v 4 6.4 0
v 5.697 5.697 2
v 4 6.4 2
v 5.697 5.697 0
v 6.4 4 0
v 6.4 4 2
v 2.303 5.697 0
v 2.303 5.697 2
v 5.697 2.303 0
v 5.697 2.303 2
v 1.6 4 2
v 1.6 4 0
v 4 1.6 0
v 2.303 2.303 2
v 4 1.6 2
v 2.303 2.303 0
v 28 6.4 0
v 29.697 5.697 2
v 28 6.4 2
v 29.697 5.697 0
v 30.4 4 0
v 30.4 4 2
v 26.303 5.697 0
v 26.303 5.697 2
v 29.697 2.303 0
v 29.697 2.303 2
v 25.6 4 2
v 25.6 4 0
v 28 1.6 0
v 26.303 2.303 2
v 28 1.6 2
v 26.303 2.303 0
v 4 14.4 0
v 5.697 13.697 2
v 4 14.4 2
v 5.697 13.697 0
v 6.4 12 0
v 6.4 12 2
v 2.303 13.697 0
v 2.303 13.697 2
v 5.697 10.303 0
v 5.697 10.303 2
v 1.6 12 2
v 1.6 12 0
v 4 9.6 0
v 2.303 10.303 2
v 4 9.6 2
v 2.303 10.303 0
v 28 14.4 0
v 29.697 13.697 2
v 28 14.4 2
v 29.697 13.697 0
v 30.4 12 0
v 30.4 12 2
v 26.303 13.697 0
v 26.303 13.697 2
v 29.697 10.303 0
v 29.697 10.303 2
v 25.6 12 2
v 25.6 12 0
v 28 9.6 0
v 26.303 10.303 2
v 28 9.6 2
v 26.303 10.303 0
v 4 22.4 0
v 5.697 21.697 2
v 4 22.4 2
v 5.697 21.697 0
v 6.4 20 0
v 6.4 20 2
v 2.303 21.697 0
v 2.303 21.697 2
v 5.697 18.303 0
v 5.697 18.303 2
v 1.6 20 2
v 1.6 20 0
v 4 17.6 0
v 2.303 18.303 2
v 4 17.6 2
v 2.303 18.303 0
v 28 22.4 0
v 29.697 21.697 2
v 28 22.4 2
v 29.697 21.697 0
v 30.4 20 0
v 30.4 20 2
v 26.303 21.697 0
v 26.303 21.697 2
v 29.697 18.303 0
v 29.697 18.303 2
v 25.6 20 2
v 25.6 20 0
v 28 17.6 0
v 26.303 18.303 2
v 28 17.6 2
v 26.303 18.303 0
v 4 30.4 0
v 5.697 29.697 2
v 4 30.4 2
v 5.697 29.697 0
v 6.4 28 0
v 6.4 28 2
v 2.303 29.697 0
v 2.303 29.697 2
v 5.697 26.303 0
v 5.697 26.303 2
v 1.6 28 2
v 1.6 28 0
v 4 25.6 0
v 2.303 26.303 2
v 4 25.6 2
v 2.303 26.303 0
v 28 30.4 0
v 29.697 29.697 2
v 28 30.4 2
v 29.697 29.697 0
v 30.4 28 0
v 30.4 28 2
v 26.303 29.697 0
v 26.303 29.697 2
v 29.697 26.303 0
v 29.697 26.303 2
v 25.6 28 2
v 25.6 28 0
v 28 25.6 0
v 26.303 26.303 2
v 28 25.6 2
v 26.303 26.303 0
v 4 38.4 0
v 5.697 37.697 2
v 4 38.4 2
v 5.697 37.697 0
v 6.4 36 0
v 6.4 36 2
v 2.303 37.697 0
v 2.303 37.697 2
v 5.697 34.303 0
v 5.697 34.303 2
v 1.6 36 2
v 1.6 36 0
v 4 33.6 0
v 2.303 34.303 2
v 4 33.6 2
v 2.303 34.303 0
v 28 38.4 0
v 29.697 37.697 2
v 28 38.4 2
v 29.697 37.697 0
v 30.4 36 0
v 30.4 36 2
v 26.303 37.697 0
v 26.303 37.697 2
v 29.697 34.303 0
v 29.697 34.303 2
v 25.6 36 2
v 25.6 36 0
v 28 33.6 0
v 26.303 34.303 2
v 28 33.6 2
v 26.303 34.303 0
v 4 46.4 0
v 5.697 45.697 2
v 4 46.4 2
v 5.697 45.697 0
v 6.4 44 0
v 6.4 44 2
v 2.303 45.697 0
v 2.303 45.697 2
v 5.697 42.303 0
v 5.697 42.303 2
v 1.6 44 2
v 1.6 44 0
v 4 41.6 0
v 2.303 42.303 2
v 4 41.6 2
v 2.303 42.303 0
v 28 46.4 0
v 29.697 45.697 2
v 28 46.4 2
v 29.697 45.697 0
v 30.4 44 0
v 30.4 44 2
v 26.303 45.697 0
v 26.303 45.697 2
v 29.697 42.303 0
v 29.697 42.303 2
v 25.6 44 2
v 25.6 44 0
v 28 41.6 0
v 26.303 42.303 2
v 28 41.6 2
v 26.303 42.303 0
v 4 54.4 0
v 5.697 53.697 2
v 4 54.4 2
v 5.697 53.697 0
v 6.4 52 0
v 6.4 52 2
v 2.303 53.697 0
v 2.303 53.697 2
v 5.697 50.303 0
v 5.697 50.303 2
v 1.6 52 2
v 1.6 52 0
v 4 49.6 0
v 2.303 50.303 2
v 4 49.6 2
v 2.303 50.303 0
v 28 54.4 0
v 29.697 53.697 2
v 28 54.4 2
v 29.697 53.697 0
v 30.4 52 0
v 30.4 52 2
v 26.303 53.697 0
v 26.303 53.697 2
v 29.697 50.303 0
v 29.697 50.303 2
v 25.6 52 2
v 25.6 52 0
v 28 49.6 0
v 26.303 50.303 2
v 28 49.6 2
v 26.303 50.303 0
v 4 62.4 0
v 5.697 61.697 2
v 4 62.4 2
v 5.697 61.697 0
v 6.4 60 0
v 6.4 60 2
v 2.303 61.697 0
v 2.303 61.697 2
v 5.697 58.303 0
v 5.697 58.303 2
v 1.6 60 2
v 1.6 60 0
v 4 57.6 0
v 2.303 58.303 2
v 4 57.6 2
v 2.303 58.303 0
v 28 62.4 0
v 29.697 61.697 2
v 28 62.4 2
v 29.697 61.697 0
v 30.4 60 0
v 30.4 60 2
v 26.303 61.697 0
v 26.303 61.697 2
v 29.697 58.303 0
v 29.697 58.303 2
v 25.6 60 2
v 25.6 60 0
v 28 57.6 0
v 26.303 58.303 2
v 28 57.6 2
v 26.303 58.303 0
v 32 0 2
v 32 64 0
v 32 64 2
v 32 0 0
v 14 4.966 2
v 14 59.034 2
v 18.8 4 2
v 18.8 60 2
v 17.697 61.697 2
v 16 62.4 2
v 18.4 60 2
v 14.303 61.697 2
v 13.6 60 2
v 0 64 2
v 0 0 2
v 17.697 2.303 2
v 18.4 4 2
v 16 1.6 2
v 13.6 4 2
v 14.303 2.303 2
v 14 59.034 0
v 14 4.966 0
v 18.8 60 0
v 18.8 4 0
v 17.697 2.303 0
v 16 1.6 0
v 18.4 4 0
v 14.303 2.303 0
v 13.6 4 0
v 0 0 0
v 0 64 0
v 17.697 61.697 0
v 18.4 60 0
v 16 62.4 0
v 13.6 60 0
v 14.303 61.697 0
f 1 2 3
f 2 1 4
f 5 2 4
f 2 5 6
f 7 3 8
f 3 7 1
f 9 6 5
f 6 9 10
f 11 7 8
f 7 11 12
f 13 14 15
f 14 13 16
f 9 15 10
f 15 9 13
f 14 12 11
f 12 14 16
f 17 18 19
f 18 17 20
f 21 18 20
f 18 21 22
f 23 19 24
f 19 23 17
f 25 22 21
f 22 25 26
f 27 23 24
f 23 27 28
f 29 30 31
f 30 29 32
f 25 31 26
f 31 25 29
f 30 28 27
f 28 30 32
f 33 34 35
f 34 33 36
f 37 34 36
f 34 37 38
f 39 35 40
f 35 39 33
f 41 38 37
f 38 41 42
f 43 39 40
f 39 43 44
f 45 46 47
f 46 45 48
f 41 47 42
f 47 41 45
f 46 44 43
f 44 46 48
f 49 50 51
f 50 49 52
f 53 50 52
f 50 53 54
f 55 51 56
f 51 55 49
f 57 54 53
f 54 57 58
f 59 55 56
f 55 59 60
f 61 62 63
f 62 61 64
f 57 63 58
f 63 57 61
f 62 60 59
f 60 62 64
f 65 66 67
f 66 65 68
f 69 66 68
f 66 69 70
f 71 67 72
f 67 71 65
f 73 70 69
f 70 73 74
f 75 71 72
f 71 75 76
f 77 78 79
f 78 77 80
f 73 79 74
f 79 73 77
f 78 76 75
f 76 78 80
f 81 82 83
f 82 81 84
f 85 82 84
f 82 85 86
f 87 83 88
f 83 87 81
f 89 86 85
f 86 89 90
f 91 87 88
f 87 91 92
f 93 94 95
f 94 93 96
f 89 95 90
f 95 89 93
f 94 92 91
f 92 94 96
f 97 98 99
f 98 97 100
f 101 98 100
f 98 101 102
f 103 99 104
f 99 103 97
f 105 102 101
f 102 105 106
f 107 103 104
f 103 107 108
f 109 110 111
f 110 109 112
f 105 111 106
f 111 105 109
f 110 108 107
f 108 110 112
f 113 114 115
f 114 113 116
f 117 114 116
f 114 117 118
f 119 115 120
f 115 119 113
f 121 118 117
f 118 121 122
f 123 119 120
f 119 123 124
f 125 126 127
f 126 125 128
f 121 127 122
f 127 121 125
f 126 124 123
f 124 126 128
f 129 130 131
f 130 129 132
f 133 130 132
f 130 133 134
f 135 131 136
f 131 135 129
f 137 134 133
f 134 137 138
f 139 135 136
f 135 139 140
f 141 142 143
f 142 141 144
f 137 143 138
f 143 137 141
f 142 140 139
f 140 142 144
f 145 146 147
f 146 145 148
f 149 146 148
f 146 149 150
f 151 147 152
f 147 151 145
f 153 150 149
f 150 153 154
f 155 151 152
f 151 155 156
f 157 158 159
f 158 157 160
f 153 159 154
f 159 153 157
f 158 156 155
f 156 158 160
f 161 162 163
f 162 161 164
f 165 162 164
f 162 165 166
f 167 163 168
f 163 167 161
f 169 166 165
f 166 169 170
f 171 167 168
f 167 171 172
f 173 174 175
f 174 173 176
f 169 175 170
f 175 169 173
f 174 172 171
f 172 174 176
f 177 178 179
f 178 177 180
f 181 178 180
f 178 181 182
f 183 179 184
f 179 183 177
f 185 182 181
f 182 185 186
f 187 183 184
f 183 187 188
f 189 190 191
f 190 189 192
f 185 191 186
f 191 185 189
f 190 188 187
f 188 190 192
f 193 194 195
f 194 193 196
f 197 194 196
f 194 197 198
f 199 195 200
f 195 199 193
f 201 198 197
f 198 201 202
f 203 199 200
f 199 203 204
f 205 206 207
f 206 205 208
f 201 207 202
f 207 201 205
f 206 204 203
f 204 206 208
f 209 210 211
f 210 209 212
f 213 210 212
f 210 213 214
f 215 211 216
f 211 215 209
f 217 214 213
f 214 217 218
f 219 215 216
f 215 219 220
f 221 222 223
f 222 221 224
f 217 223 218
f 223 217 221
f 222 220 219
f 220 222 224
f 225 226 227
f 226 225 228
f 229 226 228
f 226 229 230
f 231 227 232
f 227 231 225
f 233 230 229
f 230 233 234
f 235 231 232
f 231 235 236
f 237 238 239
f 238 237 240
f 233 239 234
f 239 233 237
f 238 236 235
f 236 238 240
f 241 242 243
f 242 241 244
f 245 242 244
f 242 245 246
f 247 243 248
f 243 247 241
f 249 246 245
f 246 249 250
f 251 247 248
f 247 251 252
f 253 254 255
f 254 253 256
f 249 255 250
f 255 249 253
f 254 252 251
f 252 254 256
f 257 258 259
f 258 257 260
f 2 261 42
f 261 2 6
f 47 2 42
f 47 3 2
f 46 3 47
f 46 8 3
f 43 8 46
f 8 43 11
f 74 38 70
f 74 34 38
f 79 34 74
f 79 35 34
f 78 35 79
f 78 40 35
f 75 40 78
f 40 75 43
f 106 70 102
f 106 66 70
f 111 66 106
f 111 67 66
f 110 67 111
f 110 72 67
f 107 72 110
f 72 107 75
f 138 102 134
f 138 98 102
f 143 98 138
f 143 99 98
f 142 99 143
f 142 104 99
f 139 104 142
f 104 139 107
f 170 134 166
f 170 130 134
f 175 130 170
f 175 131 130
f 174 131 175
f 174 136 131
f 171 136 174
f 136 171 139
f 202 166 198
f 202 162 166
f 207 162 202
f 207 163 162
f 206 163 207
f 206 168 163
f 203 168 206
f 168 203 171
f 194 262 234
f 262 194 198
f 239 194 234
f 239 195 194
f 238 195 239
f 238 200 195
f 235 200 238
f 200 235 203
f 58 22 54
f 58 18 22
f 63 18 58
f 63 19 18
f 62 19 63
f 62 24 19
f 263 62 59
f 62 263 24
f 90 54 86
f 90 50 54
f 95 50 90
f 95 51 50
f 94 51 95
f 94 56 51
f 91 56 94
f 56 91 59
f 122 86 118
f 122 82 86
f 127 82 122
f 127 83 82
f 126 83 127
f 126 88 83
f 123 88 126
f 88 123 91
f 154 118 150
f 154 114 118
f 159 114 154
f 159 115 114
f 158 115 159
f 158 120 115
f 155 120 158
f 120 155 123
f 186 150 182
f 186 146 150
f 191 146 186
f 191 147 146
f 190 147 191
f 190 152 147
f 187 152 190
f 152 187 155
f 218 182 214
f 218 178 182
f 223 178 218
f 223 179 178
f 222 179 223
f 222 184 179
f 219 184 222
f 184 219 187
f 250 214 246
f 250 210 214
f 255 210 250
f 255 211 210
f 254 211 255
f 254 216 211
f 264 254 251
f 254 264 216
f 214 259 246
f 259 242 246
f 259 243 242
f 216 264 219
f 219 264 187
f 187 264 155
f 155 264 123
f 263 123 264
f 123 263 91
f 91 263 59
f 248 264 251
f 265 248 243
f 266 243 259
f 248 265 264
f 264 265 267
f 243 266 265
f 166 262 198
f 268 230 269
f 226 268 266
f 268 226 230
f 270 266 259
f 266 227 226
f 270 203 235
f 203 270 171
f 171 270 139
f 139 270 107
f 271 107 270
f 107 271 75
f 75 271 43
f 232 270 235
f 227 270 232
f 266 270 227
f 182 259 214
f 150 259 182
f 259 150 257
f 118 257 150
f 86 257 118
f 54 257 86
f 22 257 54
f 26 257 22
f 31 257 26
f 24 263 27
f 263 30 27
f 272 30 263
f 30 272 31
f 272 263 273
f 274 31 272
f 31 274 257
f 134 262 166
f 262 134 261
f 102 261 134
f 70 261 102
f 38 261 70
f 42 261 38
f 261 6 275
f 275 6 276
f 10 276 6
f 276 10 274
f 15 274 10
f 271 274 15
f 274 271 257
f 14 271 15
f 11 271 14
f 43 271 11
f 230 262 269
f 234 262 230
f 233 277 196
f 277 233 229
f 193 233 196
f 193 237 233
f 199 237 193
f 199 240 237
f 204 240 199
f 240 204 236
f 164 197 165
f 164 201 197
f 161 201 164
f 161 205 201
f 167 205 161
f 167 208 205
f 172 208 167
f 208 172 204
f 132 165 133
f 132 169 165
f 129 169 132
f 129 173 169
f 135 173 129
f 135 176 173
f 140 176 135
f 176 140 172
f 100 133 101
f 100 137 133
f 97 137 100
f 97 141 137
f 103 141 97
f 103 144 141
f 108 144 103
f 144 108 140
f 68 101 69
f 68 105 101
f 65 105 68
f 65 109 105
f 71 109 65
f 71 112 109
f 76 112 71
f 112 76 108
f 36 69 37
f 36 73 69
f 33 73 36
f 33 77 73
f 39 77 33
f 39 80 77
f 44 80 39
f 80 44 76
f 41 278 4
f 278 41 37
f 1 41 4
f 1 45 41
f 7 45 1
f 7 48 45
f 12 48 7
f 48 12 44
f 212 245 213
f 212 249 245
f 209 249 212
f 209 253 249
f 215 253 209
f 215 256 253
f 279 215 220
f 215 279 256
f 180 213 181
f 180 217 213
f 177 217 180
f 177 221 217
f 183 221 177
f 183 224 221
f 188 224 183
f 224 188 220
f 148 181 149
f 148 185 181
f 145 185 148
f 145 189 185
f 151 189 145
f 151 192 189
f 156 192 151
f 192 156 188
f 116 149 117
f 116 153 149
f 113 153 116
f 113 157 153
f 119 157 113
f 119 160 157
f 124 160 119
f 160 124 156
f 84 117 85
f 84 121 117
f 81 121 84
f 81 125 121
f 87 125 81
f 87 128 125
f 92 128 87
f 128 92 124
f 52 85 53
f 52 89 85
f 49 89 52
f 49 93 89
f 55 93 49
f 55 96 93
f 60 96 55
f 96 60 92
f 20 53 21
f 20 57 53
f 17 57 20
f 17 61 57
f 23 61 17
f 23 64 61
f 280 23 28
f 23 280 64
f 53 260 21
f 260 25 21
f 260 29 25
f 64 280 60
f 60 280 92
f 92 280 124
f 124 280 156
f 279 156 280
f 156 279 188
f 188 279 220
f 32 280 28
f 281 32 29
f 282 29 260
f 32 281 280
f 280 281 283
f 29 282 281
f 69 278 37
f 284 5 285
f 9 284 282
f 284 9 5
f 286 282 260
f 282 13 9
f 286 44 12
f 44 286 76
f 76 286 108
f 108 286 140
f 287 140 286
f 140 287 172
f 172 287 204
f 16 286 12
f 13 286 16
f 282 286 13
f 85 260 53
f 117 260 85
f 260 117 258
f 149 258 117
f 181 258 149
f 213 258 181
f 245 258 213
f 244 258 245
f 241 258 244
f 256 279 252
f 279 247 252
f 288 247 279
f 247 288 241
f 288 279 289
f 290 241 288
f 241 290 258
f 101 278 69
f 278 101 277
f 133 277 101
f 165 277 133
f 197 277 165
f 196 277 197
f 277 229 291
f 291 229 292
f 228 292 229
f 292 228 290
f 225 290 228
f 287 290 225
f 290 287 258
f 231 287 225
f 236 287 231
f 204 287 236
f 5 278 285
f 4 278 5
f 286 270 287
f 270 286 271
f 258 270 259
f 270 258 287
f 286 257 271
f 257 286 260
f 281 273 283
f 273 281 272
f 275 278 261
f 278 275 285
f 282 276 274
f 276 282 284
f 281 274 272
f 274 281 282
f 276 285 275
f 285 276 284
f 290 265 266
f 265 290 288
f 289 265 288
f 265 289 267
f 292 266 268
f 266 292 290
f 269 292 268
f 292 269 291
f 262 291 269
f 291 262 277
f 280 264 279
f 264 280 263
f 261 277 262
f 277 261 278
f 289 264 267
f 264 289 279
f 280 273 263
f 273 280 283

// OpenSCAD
// piece configuration
height = 8;
width = 4;

// multiplier for hole size
// 1.2 PLA
hfix = 1.2;

// family configuration
hole = 4;
space = 4;
pad = space / 2;
thickness = 2;


// internal calculations
h = height * hole + (height - 1) * space + 2 * pad;
w = width * hole + (width - 1) * space + 2 * pad;
half = (width % 2 == 0) ? ((width - 2) / 2) : ((width - 1) / 2);
pos = (width % 2 == 0)
    ? pad + half*hole + (half - 1)*space + space + hole + space/2
    : pad + half*hole + (half - 1)*space + space + hole/2;
echo(half);

difference(){
//union(){

    cube([w, h, thickness]);

    for(i=[0:half-1]) {
        for(j=[0:height-1]) {
            union(){
                translate([
                    pad + (hole + space) * i + hole/2,
                    pad + (hole + space) * j + hole/2,
                    -thickness
                ]) {
                    cylinder(h=thickness * 3, r=hole/2*hfix);
                }
                translate([
                    w - pad + (hole + space) * i - hole/2,
                    pad + (hole + space) * j + hole/2,
                    -thickness
                ]) {
                    cylinder(h=thickness * 3, r=hole/2*hfix);
                }
            }
        }
    }
    
    translate([pos, pad + hole/2, -thickness ]) {
        cylinder(h=thickness * 3, r=hole/2*hfix);
    }
    translate([pos, h - pad - hole/2, -thickness ]) {
        cylinder(h=thickness * 3, r=hole/2*hfix);
    }
    translate([pos - hole/2, pad + hole/2, -thickness]) {
        cube([hole*hfix, h - pad*2 -hole, thickness*3]);
    }

    
/*union(){
    translate([2, -1, 16]){
        cube([4, epaisseur+2, 8]);
        };
    translate([7*nb_rangees-2, -1, 16]){
        cube([4, epaisseur+2, 8]);
        }
    };
    
translate([2.67,6,0]){
    cylinder(h=epaisseur+2, r=1.5);
    };

translate([8*nb_rangees-2.67,6,0]){
    cylinder(h=epaisseur+2, r=1.5);
    };

translate([0,epaisseur+1,0]){   
    rotate([90,0,0]){
        union(){
            for(i=[0:nb_rangees-1]){
                for(j=[0:2]){
                    translate([4+ 8*i, 8+8*j, 0]){cylinder(h=epaisseur+2, r=2);}
                }
            }
        }
    }
}*/


}
